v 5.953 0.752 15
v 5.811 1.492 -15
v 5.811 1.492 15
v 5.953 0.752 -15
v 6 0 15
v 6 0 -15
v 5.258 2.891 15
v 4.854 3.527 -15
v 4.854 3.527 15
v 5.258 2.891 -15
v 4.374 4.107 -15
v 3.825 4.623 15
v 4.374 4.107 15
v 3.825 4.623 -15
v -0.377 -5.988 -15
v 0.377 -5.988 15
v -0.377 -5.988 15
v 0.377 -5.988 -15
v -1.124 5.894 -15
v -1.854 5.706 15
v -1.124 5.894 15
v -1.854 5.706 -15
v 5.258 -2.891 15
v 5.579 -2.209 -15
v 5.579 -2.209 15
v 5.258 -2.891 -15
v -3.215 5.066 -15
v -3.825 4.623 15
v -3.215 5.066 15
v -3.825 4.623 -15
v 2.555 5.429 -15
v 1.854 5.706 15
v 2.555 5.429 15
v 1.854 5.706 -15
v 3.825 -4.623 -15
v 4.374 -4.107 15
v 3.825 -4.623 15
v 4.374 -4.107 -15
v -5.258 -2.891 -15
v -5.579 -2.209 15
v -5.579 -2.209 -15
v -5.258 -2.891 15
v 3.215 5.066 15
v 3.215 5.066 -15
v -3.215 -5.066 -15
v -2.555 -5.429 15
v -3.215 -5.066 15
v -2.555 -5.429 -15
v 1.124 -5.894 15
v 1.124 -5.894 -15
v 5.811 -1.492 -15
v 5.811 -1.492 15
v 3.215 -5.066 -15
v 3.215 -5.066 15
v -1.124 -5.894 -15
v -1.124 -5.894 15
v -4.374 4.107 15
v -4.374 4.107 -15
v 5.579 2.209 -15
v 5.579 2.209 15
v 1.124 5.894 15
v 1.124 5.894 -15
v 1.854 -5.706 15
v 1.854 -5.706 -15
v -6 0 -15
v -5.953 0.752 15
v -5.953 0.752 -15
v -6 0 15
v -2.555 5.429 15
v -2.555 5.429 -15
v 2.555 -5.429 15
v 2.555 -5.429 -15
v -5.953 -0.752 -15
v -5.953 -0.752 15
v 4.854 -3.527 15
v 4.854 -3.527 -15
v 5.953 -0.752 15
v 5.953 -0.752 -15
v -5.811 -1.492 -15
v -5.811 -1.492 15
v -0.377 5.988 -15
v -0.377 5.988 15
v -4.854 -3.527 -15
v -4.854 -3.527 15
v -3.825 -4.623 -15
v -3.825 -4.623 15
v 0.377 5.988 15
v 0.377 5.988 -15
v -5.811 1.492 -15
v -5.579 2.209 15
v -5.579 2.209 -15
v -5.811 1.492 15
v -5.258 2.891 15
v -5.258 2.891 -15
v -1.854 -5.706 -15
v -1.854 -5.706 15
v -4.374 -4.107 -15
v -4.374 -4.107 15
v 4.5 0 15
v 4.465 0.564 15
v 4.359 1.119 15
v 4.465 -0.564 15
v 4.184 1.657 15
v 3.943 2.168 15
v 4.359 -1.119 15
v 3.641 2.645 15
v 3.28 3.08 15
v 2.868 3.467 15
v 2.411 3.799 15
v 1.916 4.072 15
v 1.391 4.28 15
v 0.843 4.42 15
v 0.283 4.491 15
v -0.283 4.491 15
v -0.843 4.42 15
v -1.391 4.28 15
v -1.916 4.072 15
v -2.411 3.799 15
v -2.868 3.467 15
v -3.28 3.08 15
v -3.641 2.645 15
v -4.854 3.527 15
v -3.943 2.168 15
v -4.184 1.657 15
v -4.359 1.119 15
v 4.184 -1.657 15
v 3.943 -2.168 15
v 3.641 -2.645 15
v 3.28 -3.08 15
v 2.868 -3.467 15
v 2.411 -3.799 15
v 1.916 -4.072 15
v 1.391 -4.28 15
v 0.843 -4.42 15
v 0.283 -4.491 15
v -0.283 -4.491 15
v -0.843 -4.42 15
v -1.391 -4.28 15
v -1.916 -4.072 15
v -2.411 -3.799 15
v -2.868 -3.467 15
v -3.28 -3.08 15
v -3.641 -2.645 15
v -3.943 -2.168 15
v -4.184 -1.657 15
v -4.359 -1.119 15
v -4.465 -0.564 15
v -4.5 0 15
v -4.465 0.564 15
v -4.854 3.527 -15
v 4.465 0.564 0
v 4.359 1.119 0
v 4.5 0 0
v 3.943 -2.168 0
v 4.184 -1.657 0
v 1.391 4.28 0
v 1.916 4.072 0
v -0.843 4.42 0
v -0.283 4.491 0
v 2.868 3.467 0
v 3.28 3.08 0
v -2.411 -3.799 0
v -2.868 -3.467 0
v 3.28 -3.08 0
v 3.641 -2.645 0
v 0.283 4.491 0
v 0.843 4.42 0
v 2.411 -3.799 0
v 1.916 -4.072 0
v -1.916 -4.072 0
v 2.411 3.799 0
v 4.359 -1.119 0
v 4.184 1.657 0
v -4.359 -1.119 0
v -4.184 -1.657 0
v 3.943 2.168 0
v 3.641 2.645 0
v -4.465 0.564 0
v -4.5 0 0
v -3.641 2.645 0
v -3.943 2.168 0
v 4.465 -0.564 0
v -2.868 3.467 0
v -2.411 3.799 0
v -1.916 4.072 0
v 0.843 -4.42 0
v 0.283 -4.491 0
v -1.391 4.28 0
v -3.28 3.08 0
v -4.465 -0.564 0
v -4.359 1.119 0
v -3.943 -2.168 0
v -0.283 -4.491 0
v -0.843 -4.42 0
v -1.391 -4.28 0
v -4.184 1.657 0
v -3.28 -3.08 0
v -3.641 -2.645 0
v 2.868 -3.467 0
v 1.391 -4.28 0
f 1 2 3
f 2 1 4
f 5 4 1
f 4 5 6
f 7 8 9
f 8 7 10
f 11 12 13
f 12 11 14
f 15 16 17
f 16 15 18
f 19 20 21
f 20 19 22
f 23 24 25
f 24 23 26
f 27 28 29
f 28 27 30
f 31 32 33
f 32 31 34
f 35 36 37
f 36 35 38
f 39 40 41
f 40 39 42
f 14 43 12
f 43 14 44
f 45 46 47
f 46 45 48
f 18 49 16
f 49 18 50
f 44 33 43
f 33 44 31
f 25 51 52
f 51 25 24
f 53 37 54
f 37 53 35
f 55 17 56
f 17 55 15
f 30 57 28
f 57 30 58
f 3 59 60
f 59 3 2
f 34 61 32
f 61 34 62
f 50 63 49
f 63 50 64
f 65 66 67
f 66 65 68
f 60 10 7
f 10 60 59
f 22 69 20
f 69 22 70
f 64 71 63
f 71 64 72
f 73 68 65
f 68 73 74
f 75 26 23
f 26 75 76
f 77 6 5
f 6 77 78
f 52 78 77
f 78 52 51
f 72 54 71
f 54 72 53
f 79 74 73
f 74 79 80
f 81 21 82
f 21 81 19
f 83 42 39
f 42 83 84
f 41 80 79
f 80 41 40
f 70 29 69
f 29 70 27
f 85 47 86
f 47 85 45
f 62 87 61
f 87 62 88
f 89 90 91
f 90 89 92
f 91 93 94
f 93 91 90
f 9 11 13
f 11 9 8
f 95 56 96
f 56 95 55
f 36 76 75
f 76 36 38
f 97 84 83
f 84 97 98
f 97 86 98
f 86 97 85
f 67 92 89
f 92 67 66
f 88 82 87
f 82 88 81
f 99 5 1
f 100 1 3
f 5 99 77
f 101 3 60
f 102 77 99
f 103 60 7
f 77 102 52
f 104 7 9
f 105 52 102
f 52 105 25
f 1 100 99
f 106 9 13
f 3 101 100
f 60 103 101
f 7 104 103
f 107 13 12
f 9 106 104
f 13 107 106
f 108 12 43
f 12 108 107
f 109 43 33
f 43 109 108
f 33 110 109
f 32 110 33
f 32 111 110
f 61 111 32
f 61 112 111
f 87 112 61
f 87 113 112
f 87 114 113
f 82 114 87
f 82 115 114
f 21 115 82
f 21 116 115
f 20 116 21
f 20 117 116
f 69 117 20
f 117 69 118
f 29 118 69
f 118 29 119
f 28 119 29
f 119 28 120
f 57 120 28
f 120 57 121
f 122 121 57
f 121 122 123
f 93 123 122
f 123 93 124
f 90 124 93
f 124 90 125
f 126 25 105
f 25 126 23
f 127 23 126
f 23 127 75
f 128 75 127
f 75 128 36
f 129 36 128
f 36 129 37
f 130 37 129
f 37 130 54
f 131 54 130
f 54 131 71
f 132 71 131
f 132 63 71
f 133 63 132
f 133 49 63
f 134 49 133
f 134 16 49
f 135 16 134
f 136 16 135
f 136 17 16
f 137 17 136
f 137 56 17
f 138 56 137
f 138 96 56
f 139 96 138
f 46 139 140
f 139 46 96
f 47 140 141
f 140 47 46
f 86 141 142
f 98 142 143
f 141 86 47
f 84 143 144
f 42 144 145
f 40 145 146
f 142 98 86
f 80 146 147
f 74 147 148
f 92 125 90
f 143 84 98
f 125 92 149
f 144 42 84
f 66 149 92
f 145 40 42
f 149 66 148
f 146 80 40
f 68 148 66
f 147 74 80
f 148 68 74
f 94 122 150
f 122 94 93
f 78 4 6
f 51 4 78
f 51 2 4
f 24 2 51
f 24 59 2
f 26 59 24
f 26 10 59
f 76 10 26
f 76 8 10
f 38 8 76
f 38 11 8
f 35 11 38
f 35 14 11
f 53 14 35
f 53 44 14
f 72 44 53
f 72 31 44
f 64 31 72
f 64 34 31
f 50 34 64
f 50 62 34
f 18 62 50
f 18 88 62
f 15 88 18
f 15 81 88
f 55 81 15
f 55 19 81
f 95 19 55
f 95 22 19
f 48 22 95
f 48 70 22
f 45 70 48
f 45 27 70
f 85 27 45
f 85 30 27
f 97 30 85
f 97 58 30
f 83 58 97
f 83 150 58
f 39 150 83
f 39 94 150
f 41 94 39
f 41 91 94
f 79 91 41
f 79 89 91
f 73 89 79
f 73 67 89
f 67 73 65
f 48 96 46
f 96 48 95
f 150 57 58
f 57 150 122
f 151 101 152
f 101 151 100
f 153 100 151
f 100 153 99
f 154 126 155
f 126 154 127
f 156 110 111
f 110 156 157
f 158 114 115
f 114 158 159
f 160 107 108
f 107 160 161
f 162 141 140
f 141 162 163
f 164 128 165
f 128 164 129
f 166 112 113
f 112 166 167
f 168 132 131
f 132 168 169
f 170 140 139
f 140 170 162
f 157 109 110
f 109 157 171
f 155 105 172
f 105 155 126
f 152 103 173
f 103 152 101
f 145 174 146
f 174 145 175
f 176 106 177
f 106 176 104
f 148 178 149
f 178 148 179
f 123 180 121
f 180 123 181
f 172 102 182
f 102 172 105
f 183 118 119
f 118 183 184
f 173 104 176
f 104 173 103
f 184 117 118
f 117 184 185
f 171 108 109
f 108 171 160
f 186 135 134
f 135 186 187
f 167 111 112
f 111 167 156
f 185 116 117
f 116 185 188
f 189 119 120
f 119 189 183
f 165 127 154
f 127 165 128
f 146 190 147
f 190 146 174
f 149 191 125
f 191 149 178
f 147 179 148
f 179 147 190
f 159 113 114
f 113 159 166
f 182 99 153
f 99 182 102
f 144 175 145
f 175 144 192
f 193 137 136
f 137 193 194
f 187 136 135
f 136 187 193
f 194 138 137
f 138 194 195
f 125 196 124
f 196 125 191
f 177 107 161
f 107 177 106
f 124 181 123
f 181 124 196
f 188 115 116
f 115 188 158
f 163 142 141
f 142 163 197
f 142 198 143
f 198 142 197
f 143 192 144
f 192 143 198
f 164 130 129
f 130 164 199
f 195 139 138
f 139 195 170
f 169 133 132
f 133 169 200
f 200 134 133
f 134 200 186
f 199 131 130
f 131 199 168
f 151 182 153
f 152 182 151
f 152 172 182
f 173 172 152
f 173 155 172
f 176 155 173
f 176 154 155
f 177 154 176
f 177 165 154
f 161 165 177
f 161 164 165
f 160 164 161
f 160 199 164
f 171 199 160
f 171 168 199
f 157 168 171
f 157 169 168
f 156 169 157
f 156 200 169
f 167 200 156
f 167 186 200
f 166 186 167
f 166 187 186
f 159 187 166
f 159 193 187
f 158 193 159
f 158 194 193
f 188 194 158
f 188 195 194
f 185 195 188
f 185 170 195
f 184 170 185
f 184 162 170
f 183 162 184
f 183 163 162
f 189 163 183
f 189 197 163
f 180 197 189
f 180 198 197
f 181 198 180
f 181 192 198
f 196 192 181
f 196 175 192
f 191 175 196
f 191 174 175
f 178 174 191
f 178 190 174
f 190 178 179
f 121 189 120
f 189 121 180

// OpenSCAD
height = 30;
width=6;
holesize = 4.5;

$fn = 50;
module spacer() {
//detail level
	render(covexity = 1) {
		//render hole
		difference() {
			cylinder(h=height, r=width, center=true);

			//height, radius, radius, center
			cylinder(height*2.25, r=holesize, true);
		}	
	}
}

spacer();
